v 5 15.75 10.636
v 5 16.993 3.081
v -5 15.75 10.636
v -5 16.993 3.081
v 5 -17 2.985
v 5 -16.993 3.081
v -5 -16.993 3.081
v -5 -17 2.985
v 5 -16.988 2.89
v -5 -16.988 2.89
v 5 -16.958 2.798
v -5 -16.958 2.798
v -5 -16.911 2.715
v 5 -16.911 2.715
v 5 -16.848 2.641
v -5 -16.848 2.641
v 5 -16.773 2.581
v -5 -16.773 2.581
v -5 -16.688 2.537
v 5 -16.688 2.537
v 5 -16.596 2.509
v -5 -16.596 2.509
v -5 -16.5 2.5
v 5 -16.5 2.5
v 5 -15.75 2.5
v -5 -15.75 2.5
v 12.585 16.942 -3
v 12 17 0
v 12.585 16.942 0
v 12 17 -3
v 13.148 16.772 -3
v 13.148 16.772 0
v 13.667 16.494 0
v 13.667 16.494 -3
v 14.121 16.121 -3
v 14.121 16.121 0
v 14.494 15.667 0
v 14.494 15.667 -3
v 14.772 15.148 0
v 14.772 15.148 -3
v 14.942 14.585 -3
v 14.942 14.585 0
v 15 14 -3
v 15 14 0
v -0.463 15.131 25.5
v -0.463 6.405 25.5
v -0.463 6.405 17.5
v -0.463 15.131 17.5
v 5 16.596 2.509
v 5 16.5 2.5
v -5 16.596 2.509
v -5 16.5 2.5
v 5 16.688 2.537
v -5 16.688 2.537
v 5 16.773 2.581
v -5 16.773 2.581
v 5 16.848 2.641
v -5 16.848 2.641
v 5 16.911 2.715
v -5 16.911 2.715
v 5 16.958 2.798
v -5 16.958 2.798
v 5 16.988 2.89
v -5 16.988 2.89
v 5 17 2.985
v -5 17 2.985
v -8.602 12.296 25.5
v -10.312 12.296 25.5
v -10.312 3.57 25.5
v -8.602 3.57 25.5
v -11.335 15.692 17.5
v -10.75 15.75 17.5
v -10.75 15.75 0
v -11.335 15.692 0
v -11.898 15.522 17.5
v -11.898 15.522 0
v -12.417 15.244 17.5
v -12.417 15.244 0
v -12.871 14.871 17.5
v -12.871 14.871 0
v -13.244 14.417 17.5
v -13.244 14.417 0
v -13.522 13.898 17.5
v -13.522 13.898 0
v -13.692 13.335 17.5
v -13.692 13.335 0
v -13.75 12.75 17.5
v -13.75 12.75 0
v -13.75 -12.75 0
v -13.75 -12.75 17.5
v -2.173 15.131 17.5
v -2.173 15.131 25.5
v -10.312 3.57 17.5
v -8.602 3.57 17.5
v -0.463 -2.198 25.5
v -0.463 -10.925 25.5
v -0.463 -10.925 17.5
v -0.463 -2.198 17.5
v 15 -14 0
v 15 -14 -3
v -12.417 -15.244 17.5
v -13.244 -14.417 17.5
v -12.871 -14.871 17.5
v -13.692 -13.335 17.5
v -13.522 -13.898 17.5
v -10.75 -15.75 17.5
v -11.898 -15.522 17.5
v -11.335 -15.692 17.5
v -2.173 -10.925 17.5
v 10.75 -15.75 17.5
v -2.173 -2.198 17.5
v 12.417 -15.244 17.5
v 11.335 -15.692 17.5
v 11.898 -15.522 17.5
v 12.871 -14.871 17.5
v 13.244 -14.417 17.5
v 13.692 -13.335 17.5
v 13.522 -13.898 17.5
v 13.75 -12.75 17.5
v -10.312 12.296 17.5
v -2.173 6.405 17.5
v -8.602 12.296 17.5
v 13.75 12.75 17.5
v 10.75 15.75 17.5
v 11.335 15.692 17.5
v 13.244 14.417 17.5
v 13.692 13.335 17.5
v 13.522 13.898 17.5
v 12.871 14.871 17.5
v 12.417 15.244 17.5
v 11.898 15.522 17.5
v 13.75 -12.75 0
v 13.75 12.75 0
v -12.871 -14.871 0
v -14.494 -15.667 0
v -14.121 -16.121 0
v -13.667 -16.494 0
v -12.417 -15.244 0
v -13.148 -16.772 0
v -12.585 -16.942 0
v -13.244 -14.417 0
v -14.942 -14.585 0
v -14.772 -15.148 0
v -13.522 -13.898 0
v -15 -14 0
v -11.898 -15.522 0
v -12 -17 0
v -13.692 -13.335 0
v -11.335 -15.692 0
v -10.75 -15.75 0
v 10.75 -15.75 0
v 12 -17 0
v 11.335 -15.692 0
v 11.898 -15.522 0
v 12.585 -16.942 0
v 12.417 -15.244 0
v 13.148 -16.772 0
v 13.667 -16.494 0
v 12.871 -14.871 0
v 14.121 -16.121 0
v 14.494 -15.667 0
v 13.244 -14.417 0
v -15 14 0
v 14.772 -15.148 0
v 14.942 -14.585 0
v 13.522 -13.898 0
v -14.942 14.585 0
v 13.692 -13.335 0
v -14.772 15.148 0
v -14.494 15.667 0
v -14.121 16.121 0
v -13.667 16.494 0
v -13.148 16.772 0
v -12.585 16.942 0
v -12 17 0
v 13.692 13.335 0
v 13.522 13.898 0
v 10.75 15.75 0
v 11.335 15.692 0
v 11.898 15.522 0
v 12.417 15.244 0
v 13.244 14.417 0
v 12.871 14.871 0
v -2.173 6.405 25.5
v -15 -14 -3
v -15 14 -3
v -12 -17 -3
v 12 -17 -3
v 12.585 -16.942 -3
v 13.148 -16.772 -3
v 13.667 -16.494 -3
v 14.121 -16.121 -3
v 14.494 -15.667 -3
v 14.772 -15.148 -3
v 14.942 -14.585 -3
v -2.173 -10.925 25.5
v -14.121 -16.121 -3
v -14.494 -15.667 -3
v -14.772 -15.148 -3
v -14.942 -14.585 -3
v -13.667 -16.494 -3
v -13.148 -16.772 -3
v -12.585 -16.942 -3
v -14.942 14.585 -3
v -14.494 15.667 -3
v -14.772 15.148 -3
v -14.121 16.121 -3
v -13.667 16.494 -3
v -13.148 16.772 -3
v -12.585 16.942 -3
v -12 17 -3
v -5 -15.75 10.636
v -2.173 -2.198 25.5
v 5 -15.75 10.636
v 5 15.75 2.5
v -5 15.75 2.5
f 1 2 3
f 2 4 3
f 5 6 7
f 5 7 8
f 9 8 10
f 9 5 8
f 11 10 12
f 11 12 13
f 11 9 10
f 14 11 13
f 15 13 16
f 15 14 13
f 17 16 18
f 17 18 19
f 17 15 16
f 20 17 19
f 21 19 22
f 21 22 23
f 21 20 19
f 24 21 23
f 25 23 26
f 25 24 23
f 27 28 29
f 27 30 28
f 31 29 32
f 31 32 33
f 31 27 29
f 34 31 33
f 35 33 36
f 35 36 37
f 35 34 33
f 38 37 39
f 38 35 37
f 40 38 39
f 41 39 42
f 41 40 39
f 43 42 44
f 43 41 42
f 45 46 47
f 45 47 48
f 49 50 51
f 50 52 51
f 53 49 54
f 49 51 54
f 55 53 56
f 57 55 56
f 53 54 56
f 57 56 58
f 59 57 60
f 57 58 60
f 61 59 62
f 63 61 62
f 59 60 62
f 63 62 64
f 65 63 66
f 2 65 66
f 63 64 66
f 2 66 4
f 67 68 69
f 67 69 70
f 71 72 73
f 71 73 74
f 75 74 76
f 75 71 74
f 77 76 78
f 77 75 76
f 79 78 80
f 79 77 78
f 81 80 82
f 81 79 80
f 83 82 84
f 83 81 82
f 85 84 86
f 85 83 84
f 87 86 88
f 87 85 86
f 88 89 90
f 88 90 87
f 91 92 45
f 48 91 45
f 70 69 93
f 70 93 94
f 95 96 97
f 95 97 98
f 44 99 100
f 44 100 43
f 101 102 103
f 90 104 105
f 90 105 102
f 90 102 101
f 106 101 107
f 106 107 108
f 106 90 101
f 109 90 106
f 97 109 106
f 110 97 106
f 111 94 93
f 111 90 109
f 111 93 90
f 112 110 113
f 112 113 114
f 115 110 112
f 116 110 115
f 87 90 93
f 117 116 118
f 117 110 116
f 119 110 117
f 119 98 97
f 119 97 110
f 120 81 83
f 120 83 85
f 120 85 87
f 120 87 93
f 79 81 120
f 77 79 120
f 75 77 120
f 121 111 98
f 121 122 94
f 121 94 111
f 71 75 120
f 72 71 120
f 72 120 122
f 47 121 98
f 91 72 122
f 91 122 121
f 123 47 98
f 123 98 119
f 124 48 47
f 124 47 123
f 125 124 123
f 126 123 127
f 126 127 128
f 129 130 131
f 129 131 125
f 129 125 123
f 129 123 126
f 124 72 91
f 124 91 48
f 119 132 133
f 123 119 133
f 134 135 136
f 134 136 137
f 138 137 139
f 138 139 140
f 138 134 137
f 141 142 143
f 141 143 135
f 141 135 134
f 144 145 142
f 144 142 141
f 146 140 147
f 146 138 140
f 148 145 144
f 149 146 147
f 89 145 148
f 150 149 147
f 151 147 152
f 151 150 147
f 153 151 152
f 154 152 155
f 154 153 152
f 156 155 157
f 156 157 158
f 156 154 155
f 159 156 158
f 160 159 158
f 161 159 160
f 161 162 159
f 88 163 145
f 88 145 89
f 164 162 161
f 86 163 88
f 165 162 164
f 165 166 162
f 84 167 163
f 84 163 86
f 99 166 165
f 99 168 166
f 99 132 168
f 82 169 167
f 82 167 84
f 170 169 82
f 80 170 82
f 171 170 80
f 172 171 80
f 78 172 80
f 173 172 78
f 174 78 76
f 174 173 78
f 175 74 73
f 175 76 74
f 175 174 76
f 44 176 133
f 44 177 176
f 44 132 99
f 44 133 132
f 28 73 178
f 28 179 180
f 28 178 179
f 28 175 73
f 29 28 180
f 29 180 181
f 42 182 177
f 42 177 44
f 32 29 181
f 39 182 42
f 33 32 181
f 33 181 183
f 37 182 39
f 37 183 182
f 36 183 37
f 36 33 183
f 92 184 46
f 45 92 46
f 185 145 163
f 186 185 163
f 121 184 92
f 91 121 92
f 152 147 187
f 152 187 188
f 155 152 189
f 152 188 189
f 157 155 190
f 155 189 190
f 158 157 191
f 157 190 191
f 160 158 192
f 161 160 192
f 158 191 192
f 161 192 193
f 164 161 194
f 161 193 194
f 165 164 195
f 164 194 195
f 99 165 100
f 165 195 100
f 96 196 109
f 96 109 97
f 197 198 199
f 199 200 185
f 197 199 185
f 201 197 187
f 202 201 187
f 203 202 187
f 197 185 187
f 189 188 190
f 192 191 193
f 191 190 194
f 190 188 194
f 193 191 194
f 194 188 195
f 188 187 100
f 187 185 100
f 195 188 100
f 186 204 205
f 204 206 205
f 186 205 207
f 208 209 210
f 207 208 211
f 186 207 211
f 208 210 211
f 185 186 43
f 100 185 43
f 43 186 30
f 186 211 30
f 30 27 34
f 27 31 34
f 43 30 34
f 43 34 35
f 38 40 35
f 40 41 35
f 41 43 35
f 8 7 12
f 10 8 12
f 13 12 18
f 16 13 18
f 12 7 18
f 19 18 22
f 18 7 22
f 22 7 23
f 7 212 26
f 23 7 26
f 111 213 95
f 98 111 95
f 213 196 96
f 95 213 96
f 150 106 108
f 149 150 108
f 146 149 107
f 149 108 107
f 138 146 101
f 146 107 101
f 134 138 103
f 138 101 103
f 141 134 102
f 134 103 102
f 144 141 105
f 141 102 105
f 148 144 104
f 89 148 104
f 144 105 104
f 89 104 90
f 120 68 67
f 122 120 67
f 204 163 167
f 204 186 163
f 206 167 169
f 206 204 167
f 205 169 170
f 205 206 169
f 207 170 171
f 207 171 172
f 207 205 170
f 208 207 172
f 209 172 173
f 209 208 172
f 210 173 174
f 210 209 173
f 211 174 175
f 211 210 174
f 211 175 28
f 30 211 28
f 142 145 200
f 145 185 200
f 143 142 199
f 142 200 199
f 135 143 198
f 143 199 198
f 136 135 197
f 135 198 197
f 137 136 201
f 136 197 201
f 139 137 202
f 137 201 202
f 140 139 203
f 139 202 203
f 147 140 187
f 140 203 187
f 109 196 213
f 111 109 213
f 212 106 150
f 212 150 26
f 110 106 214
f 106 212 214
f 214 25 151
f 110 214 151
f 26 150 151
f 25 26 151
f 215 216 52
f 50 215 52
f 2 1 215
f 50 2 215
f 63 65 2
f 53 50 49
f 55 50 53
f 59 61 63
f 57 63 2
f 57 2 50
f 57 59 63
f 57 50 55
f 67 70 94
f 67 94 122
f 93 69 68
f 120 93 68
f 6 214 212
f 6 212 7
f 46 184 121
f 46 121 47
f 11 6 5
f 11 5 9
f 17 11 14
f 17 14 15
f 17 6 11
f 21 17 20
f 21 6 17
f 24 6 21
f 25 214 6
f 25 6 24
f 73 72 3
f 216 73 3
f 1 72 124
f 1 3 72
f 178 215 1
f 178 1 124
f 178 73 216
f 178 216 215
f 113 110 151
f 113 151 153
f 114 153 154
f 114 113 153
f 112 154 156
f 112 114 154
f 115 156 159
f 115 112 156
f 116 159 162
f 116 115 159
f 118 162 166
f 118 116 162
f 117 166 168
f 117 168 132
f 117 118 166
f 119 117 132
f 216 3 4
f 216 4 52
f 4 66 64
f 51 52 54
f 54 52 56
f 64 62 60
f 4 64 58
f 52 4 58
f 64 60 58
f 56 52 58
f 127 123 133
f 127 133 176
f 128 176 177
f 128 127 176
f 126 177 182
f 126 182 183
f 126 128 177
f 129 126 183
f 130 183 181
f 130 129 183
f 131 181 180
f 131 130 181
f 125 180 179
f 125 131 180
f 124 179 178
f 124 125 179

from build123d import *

# Parameters (mm, degrees)
SKETCH1_W           = 30
SKETCH1_H           = 34
BOSS_EXTRUDE1_DEPTH = 3
SKETCH3_W           = 27.5
SKETCH3_H           = 31.5
BOSS_EXTRUDE2_DEPTH = 25.5
FILLET1_R           = 3
BOSS_EXTRUDE3_DEPTH = 5
SKETCH5_OUTSIDE_W   = 42.712
SKETCH5_OUTSIDE_H   = 46.712
SKETCH5_OUTSIDE_W_2 = 1.709929724
SKETCH5_OUTSIDE_H_2 = 8.726730488
CUT_EXTRUDE1_DEPTH  = 8


with BuildPart() as part:
    # Sketch1 → Boss-Extrude1 (new body)
    with BuildSketch(Plane.XY):
        Rectangle(SKETCH1_W, SKETCH1_H)
    extrude(amount=-BOSS_EXTRUDE1_DEPTH)

    # Sketch3 → Boss-Extrude2 (add)
    with BuildSketch(Plane.XY):
        Rectangle(SKETCH3_W, SKETCH3_H)
    extrude(amount=BOSS_EXTRUDE2_DEPTH)

    # Fillet1
    fillet1_edges = [part.edges().sort_by_distance(p)[0] for p in [
        (13.75, -15.75, 12.75),
        (13.75, 15.75, 12.75),
        (-13.75, 15.75, 12.75),
        (-13.75, -15.75, 12.75),
        (15, -17, -1.5),
        (-15, -17, -1.5),
        (-15, 17, -1.5),
        (15, 17, -1.5),
    ]]
    fillet(fillet1_edges, radius=FILLET1_R)

    # Sketch4 → Boss-Extrude3 (add, symmetric)
    with BuildSketch(Plane(origin=(0, 0, 0), x_dir=(0, 0, -1), z_dir=(1, 0, 0))):
        with BuildLine():
            Line((-2.5, 15.75), (-2.5, 16.5))
            ThreePointArc((-2.5, 16.5), (-2.676424395, 16.881180834), (-3.081195313, 16.993363275))
            Line((-3.081195313, 16.993363275), (-10.636185348, 15.75))
            Line((-10.636185348, 15.75), (-2.5, 15.75))
        make_face()
        with BuildLine():
            Line((-2.5, -15.75), (-10.636185348, -15.75))
            Line((-10.636185348, -15.75), (-3.081195313, -16.993363275))
            ThreePointArc((-3.081195313, -16.993363275), (-2.676424395, -16.881180834), (-2.5, -16.5))
            Line((-2.5, -16.5), (-2.5, -15.75))
        make_face()
    extrude(amount=BOSS_EXTRUDE3_DEPTH, both=True)

    # Sketch5 outside → Cut-Extrude1 (cut)
    with BuildSketch(Plane.XY.offset(25.5)):
        Rectangle(SKETCH5_OUTSIDE_W, SKETCH5_OUTSIDE_H)
        with Locations((-9.457120396, 7.933102862)):
            Rectangle(SKETCH5_OUTSIDE_W_2, SKETCH5_OUTSIDE_H_2, mode=Mode.SUBTRACT)
        with Locations((-1.31810636, 10.768093543)):
            Rectangle(SKETCH5_OUTSIDE_W_2, SKETCH5_OUTSIDE_H_2, mode=Mode.SUBTRACT)
        with Locations((-1.31810636, -6.561253842)):
            Rectangle(SKETCH5_OUTSIDE_W_2, SKETCH5_OUTSIDE_H_2, mode=Mode.SUBTRACT)
    extrude(amount=-CUT_EXTRUDE1_DEPTH, mode=Mode.SUBTRACT)


solid = part.part
